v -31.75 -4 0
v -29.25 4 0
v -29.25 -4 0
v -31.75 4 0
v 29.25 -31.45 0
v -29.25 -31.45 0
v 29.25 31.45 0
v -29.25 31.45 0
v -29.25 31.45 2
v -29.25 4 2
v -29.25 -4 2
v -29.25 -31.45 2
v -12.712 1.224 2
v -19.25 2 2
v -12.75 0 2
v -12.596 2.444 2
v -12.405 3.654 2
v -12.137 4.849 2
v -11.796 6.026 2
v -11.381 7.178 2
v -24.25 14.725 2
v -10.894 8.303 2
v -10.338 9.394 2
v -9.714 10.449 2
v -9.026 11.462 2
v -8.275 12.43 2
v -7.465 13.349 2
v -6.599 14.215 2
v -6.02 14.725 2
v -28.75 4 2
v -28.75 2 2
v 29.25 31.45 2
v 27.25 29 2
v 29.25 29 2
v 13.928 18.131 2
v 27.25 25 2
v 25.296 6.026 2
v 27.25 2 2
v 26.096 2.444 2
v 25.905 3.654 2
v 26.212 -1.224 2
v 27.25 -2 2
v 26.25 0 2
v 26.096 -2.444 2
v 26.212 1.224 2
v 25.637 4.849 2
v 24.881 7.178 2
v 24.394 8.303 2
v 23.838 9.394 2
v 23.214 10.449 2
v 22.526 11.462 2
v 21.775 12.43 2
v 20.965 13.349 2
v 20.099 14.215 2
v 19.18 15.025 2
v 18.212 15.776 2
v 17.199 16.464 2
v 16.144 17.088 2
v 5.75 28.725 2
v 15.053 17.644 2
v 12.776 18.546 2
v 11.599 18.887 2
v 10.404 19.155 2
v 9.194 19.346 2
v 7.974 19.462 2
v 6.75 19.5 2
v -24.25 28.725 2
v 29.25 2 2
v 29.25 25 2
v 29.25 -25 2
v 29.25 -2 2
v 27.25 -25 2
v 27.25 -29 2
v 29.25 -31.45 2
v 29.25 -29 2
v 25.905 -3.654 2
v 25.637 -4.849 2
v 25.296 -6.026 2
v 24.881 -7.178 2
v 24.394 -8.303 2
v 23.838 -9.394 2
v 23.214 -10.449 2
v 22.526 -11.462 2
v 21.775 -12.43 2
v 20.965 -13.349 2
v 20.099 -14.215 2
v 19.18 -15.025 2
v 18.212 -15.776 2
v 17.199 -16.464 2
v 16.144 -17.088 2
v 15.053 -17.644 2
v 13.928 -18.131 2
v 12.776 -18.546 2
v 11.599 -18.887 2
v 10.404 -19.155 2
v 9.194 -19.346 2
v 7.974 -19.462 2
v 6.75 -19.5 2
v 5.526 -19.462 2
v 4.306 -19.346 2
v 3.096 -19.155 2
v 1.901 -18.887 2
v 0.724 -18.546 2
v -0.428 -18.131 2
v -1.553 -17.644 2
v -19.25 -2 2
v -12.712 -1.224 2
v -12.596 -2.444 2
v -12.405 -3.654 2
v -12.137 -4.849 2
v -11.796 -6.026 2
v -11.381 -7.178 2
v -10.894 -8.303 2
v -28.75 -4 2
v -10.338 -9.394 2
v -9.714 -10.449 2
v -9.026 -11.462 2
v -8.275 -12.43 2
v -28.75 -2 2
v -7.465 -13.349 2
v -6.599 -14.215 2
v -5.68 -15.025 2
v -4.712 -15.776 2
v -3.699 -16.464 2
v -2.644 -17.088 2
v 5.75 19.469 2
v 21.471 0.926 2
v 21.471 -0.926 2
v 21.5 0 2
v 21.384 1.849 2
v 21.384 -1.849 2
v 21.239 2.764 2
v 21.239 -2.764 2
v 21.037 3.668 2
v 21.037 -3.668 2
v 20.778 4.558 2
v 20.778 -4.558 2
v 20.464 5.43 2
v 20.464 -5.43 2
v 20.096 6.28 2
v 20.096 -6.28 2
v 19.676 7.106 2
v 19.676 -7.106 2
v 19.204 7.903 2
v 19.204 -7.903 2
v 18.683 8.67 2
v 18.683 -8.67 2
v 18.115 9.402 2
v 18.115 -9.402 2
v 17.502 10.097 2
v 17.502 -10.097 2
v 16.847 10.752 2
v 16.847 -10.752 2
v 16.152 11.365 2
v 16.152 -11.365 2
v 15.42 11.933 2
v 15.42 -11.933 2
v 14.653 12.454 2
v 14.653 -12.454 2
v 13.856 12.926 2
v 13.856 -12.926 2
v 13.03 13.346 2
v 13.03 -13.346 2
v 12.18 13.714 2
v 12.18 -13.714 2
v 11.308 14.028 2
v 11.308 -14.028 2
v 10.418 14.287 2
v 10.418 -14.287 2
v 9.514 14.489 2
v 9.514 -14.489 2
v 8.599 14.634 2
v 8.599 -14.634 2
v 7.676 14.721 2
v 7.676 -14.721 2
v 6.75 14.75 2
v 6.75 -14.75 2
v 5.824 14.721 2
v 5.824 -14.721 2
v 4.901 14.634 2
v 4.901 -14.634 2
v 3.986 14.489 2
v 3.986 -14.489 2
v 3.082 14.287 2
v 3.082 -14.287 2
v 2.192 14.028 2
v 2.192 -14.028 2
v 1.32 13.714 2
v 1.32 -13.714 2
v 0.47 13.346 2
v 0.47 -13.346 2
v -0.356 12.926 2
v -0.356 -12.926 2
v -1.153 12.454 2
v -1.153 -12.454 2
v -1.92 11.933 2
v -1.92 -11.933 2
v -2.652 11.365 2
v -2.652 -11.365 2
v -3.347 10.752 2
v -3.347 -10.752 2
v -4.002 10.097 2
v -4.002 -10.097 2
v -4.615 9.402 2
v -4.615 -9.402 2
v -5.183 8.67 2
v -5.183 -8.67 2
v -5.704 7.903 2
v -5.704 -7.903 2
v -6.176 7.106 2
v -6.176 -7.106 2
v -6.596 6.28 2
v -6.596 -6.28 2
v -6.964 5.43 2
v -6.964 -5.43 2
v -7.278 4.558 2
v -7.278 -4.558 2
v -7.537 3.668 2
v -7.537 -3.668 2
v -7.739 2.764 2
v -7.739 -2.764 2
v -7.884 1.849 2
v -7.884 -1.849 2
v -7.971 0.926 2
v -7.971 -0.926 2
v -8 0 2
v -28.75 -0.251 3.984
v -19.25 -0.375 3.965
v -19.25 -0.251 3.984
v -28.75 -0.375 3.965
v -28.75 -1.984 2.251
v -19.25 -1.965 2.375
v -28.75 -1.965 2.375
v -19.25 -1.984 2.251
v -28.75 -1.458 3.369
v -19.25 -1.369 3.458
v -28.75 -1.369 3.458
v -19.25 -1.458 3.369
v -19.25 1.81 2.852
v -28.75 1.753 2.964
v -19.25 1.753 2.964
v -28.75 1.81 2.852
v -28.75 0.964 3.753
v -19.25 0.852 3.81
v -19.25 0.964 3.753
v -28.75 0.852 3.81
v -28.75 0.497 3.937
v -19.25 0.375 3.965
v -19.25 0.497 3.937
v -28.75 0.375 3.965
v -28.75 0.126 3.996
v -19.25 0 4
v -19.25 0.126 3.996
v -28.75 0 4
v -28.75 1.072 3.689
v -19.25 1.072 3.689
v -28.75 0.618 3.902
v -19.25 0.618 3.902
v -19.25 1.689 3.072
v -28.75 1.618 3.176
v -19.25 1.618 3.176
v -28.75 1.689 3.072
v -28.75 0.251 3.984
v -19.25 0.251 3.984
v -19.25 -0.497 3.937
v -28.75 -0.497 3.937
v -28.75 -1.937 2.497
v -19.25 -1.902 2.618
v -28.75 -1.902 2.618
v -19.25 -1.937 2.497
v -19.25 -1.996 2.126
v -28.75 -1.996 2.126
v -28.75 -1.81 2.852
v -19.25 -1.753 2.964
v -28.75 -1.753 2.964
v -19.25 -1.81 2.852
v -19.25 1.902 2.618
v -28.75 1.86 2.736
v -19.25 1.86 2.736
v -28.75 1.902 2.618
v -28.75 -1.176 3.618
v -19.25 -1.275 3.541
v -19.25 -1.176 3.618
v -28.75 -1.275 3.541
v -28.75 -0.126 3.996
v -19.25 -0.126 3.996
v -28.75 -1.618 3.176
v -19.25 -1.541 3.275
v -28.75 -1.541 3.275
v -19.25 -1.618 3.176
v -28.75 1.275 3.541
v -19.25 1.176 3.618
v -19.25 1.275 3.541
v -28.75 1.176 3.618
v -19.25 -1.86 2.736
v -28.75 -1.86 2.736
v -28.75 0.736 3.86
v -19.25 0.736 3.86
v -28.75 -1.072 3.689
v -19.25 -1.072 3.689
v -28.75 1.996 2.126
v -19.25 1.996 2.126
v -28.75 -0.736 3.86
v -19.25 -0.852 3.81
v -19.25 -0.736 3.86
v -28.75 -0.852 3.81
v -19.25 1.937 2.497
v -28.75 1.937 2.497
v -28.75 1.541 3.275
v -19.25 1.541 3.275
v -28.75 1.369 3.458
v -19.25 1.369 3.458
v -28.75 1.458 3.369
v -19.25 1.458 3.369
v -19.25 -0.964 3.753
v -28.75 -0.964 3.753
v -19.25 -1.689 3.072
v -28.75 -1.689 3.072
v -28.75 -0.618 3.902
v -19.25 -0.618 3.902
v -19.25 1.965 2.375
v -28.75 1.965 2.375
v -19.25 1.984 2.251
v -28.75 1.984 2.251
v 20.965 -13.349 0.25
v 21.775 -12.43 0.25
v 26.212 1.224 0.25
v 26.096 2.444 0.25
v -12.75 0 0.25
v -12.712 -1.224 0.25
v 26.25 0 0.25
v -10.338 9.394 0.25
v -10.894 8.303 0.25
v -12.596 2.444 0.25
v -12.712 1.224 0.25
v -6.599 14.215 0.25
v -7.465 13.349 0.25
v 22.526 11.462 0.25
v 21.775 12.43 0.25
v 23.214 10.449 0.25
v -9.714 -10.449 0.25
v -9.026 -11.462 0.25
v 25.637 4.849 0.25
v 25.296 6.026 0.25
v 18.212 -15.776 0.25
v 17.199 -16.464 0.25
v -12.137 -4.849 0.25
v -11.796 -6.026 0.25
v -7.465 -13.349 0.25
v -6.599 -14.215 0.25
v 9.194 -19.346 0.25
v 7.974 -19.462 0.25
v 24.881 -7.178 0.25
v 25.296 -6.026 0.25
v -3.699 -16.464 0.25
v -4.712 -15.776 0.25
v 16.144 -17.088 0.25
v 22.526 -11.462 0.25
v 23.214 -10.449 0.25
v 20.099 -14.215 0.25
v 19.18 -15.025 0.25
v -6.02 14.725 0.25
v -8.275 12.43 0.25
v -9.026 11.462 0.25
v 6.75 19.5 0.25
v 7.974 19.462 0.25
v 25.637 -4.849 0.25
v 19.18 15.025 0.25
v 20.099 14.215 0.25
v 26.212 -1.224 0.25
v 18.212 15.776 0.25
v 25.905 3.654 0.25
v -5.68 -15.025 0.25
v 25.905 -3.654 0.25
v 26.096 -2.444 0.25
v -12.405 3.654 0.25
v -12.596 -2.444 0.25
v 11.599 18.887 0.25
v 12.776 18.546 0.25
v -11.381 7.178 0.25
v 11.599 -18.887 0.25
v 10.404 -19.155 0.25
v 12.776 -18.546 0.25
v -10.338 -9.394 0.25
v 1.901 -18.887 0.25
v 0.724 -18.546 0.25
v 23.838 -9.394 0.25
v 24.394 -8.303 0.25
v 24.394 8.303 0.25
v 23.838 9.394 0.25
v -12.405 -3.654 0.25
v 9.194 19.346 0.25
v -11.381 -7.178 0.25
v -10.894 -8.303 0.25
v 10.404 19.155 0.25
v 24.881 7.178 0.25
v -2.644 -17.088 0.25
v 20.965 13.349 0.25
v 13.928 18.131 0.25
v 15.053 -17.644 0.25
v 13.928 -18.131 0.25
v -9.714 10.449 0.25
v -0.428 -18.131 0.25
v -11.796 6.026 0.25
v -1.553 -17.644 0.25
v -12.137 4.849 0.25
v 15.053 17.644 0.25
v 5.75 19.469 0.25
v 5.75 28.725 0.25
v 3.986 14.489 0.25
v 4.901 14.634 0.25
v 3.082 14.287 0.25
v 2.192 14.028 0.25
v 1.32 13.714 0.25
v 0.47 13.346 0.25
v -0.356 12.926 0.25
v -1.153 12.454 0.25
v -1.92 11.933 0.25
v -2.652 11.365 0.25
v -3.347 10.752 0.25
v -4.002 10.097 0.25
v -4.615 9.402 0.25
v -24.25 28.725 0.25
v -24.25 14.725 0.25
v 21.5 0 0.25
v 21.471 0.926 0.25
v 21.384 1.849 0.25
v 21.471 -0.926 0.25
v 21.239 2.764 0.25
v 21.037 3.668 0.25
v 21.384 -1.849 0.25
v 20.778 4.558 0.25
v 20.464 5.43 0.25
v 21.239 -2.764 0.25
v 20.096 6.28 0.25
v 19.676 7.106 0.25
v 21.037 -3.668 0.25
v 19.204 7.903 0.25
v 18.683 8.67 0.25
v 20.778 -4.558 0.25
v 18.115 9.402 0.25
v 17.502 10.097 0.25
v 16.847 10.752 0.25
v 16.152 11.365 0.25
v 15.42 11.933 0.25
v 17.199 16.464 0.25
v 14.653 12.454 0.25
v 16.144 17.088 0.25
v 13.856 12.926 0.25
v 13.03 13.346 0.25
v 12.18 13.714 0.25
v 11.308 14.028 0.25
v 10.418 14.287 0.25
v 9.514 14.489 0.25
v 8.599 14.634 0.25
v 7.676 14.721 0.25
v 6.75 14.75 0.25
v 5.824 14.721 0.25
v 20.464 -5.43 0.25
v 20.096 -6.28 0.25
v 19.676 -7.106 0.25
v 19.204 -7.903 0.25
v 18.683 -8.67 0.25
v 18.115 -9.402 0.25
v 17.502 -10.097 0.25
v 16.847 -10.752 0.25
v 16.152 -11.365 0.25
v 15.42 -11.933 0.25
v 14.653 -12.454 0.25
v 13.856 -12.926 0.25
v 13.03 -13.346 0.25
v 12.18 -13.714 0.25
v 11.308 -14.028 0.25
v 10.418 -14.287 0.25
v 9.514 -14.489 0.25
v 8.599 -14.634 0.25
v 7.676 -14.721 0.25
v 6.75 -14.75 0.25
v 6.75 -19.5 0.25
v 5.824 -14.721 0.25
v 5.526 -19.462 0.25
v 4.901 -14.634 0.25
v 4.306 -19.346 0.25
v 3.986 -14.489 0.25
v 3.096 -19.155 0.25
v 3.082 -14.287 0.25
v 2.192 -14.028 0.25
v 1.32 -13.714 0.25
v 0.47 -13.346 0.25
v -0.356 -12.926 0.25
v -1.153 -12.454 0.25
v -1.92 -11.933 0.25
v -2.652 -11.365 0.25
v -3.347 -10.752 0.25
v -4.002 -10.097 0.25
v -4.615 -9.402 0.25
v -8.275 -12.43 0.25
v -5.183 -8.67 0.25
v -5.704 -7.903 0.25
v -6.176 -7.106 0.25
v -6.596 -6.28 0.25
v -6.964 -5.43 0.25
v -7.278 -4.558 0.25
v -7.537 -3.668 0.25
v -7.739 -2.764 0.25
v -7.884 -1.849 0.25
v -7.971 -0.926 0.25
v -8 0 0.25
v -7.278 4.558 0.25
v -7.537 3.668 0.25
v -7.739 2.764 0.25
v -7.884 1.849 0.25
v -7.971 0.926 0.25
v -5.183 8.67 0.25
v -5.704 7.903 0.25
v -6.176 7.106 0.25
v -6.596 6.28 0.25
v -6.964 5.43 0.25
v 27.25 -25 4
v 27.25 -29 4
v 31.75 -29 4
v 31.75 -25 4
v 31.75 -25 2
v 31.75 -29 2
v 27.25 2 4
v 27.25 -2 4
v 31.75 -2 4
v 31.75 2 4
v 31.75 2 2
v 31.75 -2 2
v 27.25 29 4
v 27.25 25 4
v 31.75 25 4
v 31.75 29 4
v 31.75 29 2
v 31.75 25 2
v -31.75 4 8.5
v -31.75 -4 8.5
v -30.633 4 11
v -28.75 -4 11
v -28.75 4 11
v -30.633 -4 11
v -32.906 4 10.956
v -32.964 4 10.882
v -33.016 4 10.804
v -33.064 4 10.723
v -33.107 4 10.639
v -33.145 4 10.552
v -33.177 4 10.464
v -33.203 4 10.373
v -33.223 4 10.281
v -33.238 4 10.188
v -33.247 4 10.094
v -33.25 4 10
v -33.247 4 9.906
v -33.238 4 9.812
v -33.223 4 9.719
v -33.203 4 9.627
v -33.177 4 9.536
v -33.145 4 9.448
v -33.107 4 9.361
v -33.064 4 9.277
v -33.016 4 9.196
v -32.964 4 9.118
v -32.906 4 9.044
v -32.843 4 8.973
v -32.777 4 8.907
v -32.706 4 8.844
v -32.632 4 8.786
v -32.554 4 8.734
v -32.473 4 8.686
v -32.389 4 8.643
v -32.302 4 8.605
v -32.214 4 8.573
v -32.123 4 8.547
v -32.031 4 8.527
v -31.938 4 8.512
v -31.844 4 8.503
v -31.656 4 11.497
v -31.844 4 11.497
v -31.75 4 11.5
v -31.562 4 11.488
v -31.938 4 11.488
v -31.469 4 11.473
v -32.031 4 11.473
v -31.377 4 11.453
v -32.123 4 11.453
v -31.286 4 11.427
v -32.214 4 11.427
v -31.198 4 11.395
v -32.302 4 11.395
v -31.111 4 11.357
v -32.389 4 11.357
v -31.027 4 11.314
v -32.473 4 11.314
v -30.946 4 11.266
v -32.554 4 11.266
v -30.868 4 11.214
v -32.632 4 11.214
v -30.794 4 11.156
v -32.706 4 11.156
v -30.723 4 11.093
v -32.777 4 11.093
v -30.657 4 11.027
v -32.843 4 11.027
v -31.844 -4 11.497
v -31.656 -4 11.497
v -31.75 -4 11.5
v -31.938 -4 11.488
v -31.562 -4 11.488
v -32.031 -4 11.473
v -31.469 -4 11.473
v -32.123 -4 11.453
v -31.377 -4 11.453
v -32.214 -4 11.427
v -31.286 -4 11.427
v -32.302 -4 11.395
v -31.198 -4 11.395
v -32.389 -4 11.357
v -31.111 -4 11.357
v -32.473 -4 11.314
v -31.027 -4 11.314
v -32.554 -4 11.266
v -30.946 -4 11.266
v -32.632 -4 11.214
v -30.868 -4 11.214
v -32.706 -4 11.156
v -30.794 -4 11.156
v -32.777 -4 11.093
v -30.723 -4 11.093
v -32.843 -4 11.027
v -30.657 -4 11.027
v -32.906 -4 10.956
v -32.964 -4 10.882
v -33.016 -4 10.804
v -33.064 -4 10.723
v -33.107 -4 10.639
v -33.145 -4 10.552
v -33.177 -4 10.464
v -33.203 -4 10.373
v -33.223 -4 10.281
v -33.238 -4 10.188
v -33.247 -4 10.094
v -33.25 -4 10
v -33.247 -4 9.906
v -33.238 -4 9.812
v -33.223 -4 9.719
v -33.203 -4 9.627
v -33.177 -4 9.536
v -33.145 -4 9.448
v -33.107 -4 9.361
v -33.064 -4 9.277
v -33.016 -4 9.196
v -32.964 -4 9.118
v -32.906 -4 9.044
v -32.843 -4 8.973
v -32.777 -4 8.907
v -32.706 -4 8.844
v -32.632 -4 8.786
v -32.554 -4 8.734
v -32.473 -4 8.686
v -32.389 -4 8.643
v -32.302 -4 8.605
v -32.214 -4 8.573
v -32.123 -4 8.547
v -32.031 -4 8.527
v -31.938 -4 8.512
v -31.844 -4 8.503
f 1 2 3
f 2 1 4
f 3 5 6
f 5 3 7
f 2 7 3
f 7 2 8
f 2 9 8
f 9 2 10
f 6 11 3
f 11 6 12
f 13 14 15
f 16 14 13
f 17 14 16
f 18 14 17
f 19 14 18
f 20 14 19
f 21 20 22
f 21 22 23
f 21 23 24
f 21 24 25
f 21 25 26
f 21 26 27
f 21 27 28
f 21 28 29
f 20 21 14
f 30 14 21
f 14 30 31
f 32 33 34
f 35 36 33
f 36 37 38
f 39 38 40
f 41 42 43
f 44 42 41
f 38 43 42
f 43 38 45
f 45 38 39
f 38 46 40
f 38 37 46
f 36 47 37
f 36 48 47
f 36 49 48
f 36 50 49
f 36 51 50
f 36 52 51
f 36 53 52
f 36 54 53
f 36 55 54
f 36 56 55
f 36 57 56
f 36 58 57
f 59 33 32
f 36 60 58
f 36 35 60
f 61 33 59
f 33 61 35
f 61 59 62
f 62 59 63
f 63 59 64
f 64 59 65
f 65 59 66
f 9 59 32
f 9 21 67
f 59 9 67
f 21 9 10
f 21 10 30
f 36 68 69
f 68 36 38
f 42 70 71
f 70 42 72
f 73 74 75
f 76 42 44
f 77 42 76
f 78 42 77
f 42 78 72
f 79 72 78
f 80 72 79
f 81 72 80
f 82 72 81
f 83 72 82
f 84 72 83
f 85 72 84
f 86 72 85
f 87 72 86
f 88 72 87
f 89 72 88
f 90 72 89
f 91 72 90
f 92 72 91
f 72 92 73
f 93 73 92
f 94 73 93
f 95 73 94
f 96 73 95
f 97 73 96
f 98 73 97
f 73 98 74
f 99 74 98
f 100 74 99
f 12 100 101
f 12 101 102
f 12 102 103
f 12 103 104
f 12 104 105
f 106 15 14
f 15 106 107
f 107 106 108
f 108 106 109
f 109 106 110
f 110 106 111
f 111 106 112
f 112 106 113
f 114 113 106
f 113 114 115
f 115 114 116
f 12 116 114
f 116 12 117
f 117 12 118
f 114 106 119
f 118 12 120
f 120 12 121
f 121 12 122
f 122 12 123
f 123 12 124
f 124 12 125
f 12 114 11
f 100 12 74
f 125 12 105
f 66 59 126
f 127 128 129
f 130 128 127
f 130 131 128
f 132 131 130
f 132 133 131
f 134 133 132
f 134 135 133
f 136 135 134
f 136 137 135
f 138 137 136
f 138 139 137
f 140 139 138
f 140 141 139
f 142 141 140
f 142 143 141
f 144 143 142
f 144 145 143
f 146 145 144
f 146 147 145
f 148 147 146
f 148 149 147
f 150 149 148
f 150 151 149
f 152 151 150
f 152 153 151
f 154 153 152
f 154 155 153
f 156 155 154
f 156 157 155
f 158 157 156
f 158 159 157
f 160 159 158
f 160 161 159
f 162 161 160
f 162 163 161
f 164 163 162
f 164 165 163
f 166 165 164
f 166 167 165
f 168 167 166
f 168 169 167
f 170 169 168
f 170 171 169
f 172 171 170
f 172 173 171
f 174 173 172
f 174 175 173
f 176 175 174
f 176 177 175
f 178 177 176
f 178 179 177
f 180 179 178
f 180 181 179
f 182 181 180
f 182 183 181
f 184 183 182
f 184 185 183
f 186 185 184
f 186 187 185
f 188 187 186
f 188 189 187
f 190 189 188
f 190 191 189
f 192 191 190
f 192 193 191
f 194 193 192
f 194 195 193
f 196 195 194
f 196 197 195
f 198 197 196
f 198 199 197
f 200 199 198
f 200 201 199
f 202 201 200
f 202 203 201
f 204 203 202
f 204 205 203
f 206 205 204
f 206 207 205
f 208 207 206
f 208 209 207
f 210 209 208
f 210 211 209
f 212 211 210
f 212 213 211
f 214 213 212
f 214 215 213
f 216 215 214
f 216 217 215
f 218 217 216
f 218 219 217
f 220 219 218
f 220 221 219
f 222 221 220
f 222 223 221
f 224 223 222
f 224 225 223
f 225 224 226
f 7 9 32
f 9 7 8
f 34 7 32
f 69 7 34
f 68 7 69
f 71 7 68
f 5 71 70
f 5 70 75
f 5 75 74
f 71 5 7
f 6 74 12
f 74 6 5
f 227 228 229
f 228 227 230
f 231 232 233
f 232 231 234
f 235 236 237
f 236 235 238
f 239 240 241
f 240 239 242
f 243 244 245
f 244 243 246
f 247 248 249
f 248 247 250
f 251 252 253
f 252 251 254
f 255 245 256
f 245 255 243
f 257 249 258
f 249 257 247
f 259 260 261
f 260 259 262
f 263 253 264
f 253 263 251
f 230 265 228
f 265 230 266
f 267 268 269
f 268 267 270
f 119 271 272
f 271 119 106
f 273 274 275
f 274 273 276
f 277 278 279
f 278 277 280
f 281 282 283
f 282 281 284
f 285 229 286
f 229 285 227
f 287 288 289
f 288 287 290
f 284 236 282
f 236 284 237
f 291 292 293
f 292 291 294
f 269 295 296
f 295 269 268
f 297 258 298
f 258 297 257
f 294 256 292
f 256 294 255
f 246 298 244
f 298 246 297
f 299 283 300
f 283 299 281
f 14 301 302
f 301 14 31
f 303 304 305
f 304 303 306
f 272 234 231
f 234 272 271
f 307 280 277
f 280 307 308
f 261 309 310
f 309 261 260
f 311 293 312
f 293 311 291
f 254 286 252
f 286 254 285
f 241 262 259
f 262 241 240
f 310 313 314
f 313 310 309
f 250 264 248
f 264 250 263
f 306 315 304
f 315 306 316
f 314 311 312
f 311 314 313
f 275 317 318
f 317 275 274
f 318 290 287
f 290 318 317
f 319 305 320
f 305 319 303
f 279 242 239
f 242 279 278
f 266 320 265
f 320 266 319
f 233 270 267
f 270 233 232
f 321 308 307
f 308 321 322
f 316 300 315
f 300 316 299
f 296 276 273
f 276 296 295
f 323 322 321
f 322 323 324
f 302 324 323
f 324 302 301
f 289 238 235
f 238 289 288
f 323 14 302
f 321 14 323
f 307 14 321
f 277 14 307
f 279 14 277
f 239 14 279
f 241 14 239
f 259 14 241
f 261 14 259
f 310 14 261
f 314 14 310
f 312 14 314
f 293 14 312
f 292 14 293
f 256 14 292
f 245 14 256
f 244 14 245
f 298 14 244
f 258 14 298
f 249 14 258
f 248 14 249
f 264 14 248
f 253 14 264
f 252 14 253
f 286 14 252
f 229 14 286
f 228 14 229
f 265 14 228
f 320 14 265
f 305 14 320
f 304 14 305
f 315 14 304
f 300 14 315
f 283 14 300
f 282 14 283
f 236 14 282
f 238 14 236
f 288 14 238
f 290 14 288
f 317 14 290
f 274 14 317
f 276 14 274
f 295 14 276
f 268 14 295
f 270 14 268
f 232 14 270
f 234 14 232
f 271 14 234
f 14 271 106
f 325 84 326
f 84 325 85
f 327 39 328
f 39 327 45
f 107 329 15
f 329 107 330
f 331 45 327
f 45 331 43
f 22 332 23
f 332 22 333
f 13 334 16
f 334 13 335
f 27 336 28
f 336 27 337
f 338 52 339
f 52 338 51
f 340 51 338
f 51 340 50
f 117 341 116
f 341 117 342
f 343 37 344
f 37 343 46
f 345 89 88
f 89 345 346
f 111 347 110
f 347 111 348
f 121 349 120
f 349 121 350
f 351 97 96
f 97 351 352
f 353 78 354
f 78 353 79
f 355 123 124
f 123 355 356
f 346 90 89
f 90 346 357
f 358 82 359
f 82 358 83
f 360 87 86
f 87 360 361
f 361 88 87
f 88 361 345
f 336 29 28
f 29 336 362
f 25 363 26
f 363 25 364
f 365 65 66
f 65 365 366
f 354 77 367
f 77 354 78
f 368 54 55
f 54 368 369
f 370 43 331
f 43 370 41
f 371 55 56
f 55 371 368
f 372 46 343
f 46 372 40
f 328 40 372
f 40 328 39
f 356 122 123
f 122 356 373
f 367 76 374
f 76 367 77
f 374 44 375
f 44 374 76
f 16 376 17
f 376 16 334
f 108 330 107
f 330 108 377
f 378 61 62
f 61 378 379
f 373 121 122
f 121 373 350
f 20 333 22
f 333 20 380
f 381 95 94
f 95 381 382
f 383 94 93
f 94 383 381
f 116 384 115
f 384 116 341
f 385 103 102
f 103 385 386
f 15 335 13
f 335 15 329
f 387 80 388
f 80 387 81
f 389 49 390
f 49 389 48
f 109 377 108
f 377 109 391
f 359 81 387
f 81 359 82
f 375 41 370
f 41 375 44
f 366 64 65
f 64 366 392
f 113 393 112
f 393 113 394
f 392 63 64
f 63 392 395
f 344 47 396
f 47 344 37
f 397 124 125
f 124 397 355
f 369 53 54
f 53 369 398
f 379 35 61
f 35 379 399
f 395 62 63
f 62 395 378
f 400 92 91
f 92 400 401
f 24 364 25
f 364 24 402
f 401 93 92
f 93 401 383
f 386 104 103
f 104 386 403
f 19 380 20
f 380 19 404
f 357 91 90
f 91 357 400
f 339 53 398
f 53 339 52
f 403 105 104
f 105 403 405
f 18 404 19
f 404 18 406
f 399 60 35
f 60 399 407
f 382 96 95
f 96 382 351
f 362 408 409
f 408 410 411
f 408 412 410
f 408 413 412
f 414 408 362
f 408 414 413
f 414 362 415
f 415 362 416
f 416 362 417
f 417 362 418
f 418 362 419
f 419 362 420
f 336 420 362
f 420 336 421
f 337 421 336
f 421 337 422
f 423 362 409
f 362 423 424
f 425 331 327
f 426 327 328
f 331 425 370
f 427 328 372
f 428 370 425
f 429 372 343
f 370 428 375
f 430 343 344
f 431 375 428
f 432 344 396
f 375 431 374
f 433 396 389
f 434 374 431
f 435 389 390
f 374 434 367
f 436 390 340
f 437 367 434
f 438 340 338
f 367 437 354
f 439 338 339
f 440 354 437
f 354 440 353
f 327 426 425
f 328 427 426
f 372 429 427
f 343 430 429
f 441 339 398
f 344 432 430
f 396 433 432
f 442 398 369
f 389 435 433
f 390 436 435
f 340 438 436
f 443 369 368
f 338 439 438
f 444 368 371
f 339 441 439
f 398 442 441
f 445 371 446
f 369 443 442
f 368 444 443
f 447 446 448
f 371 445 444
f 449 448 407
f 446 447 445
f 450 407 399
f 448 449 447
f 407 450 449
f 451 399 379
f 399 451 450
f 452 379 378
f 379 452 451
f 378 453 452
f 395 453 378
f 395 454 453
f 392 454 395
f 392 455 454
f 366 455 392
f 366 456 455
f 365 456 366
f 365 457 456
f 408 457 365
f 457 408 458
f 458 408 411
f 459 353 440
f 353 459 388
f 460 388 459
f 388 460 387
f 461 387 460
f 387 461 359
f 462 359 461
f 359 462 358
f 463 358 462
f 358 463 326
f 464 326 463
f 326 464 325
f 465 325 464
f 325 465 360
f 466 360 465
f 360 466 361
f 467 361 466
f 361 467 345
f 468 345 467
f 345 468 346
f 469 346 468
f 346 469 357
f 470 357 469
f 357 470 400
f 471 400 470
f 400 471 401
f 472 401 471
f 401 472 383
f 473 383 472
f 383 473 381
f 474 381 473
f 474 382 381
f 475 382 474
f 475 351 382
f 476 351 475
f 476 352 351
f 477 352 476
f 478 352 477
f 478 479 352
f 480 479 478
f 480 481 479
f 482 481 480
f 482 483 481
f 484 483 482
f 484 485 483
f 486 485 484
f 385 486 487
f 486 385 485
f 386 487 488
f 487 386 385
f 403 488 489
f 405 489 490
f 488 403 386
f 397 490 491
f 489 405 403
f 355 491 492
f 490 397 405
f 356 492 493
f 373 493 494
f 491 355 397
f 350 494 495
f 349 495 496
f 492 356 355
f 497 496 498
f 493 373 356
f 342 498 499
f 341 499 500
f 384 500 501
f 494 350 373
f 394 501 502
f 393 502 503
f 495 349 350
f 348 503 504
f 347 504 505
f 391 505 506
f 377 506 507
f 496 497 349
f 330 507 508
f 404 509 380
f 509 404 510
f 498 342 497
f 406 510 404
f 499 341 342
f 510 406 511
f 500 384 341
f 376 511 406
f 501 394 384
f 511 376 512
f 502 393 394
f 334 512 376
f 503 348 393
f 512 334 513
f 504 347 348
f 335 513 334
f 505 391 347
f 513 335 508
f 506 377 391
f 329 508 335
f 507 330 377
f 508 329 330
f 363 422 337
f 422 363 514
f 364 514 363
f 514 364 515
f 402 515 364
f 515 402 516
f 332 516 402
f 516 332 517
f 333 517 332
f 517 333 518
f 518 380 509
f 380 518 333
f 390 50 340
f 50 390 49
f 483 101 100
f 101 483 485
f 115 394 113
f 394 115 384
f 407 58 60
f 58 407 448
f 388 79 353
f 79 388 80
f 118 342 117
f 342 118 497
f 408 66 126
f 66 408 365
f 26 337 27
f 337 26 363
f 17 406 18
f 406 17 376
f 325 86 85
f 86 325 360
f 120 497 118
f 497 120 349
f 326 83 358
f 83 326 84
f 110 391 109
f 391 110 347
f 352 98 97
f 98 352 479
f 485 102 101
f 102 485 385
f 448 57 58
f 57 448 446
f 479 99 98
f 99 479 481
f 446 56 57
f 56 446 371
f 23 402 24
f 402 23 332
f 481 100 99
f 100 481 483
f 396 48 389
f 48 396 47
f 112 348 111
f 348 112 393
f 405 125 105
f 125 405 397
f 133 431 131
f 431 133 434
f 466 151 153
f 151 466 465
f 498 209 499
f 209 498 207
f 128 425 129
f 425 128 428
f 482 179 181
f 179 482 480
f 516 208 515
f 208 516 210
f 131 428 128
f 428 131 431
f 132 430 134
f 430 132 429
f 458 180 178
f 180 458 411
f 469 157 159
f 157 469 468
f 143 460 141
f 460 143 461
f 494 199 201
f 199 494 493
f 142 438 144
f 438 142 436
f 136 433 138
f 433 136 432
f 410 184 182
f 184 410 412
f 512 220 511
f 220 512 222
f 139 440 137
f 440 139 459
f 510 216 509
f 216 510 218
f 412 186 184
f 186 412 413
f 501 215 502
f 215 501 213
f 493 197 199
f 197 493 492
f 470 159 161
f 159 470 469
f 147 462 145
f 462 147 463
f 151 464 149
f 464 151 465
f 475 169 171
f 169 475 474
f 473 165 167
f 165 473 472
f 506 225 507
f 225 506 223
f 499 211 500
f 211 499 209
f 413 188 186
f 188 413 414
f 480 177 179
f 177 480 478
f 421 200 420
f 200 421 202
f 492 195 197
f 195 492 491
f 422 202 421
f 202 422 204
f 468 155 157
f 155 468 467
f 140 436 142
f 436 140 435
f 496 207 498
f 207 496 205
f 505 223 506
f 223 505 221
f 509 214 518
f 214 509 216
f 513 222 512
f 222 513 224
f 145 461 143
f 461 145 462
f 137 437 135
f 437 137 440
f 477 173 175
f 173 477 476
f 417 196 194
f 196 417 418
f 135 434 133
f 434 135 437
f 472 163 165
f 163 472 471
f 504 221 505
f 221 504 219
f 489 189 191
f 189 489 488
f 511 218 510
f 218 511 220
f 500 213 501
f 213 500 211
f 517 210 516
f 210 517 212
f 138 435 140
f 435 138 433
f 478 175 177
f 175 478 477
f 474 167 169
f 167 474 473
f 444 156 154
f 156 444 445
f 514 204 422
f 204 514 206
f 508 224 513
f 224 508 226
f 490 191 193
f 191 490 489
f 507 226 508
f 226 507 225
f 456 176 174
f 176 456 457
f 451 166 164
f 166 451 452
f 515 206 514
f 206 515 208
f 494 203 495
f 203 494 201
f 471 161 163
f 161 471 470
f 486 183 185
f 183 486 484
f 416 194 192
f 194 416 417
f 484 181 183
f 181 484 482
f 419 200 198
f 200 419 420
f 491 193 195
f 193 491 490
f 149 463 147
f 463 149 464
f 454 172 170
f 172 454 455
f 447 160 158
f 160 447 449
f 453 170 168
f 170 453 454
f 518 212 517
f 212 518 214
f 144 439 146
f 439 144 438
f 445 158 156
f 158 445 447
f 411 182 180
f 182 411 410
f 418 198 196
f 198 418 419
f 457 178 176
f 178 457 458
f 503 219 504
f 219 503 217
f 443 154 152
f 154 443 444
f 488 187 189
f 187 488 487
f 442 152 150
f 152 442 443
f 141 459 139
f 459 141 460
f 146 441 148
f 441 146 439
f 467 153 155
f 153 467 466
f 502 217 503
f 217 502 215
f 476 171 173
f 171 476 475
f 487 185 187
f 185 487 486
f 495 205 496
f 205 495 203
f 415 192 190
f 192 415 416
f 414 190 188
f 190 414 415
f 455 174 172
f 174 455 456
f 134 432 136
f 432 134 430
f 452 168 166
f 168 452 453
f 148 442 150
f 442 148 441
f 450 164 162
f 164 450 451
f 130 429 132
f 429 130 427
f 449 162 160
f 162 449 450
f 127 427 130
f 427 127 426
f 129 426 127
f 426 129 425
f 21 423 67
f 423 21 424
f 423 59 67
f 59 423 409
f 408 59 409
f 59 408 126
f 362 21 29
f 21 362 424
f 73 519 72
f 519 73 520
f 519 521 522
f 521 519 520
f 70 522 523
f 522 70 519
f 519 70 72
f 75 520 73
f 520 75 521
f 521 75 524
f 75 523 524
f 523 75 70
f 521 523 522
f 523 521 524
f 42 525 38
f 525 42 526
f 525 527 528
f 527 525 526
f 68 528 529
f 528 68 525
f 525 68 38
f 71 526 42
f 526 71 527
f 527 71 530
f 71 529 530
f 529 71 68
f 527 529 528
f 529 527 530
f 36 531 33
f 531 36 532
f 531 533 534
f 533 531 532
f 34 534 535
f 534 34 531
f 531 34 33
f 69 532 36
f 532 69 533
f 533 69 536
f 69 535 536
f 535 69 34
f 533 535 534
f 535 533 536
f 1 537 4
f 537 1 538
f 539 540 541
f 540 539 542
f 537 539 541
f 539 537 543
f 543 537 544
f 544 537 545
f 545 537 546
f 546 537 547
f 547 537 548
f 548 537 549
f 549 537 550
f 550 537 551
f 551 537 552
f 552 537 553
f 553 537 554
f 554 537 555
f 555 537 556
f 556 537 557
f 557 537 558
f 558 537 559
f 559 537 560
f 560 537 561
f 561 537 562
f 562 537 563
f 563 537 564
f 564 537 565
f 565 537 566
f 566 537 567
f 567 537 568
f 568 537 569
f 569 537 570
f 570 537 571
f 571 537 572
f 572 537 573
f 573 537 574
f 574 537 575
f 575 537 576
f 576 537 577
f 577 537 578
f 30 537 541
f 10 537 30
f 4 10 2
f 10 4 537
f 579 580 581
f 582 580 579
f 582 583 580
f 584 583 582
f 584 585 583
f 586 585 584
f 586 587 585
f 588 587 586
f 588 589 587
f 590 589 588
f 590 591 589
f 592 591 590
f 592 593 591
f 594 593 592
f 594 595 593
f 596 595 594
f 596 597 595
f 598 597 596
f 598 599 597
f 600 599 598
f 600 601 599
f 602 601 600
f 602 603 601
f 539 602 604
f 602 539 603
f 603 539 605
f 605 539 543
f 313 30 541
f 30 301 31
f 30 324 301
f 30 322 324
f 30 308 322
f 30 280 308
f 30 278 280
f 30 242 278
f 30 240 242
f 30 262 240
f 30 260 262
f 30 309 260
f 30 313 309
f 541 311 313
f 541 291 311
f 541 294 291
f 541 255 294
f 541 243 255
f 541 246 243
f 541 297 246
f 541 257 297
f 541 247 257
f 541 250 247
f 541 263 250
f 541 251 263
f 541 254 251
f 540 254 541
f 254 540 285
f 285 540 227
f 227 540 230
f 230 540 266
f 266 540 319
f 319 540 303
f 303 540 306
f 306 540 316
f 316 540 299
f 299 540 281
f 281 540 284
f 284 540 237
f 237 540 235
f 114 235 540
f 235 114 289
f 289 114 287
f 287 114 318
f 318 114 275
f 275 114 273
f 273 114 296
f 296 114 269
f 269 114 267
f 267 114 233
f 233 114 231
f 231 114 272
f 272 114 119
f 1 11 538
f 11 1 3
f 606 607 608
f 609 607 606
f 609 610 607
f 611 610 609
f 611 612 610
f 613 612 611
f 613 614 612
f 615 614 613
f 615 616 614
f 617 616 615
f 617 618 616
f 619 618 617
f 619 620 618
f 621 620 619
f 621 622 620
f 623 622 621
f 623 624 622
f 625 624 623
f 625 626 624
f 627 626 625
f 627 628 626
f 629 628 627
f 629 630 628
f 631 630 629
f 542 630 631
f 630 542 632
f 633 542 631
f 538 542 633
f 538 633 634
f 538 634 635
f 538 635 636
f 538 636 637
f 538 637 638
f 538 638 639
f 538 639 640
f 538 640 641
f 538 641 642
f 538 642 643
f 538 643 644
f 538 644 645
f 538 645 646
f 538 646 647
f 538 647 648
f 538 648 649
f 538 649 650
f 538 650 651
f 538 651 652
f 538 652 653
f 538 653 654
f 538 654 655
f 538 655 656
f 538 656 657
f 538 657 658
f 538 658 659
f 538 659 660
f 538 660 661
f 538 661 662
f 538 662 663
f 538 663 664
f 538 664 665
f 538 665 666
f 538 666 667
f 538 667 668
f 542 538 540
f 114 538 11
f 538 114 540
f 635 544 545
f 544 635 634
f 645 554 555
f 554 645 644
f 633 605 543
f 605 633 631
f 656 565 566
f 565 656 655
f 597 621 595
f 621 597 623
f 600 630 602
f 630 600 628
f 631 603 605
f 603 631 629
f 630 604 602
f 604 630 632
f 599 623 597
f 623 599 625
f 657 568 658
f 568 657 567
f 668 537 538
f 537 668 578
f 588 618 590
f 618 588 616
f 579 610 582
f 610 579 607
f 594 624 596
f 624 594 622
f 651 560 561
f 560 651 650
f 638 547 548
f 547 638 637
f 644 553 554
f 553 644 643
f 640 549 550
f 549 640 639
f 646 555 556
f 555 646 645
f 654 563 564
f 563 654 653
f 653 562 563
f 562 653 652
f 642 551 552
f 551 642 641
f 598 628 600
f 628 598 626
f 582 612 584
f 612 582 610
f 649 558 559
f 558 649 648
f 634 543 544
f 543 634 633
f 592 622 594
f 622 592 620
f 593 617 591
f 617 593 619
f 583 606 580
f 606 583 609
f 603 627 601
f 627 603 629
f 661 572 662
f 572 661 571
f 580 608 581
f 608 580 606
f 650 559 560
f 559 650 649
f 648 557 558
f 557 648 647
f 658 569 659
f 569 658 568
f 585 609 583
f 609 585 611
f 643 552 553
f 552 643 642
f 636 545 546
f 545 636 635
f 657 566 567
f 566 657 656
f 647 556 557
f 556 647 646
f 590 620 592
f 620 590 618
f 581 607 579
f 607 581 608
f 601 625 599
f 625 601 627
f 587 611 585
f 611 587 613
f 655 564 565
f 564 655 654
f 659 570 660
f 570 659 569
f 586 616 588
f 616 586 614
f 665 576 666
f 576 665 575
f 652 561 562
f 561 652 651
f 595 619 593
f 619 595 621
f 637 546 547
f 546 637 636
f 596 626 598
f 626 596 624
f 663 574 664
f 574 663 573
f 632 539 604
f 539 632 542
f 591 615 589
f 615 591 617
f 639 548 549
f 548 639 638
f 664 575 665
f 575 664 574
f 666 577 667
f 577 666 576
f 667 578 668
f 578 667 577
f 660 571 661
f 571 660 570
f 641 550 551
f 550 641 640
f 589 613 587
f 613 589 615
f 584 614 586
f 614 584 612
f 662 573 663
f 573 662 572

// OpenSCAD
$fn=100;
h=2;
coil_h=1.75;
coil_d1=29.5;
coil_d2=39;
b=58.5;
l=62.9;
difference()
{
    union()
    {
        linear_extrude(h) square([b,l],true);
        translate([-b/2,0,2]) rotate([0,90,0]) linear_extrude(10) circle(d=4);
    }
    union()
    {
        translate([(b-coil_d2)/2-3,0,h-coil_h]) difference()
        {
          linear_extrude(coil_h+1) circle(d=coil_d2);
          linear_extrude(coil_h+1) circle(d=coil_d1);
        }
        translate([-b/2+20,l/4+7-1,h-coil_h]) linear_extrude(coil_h+1) square([30,14],true);
    }
}


translate([b/2-1,-27,0]) union()
{
    linear_extrude(4) square([2,4],true);
    translate([2,0,2]) linear_extrude(2) square([2+1,4],true);
}
translate([b/2-1,0,0]) union()
{
    linear_extrude(4) square([2,4],true);
    translate([2,0,2]) linear_extrude(2) square([2+1,4],true);
}
translate([b/2-1,+27,0]) union()
{
    linear_extrude(4) square([2,4],true);
    translate([2,0,2]) linear_extrude(2) square([2+1,4],true);
}

translate([-b/2-1,0,0]) union()
{
    linear_extrude(9+2) square([3,8],true);
    translate([-1.5,4,9+1]) rotate([90,0,0]) linear_extrude(8) circle(d=3);
}
